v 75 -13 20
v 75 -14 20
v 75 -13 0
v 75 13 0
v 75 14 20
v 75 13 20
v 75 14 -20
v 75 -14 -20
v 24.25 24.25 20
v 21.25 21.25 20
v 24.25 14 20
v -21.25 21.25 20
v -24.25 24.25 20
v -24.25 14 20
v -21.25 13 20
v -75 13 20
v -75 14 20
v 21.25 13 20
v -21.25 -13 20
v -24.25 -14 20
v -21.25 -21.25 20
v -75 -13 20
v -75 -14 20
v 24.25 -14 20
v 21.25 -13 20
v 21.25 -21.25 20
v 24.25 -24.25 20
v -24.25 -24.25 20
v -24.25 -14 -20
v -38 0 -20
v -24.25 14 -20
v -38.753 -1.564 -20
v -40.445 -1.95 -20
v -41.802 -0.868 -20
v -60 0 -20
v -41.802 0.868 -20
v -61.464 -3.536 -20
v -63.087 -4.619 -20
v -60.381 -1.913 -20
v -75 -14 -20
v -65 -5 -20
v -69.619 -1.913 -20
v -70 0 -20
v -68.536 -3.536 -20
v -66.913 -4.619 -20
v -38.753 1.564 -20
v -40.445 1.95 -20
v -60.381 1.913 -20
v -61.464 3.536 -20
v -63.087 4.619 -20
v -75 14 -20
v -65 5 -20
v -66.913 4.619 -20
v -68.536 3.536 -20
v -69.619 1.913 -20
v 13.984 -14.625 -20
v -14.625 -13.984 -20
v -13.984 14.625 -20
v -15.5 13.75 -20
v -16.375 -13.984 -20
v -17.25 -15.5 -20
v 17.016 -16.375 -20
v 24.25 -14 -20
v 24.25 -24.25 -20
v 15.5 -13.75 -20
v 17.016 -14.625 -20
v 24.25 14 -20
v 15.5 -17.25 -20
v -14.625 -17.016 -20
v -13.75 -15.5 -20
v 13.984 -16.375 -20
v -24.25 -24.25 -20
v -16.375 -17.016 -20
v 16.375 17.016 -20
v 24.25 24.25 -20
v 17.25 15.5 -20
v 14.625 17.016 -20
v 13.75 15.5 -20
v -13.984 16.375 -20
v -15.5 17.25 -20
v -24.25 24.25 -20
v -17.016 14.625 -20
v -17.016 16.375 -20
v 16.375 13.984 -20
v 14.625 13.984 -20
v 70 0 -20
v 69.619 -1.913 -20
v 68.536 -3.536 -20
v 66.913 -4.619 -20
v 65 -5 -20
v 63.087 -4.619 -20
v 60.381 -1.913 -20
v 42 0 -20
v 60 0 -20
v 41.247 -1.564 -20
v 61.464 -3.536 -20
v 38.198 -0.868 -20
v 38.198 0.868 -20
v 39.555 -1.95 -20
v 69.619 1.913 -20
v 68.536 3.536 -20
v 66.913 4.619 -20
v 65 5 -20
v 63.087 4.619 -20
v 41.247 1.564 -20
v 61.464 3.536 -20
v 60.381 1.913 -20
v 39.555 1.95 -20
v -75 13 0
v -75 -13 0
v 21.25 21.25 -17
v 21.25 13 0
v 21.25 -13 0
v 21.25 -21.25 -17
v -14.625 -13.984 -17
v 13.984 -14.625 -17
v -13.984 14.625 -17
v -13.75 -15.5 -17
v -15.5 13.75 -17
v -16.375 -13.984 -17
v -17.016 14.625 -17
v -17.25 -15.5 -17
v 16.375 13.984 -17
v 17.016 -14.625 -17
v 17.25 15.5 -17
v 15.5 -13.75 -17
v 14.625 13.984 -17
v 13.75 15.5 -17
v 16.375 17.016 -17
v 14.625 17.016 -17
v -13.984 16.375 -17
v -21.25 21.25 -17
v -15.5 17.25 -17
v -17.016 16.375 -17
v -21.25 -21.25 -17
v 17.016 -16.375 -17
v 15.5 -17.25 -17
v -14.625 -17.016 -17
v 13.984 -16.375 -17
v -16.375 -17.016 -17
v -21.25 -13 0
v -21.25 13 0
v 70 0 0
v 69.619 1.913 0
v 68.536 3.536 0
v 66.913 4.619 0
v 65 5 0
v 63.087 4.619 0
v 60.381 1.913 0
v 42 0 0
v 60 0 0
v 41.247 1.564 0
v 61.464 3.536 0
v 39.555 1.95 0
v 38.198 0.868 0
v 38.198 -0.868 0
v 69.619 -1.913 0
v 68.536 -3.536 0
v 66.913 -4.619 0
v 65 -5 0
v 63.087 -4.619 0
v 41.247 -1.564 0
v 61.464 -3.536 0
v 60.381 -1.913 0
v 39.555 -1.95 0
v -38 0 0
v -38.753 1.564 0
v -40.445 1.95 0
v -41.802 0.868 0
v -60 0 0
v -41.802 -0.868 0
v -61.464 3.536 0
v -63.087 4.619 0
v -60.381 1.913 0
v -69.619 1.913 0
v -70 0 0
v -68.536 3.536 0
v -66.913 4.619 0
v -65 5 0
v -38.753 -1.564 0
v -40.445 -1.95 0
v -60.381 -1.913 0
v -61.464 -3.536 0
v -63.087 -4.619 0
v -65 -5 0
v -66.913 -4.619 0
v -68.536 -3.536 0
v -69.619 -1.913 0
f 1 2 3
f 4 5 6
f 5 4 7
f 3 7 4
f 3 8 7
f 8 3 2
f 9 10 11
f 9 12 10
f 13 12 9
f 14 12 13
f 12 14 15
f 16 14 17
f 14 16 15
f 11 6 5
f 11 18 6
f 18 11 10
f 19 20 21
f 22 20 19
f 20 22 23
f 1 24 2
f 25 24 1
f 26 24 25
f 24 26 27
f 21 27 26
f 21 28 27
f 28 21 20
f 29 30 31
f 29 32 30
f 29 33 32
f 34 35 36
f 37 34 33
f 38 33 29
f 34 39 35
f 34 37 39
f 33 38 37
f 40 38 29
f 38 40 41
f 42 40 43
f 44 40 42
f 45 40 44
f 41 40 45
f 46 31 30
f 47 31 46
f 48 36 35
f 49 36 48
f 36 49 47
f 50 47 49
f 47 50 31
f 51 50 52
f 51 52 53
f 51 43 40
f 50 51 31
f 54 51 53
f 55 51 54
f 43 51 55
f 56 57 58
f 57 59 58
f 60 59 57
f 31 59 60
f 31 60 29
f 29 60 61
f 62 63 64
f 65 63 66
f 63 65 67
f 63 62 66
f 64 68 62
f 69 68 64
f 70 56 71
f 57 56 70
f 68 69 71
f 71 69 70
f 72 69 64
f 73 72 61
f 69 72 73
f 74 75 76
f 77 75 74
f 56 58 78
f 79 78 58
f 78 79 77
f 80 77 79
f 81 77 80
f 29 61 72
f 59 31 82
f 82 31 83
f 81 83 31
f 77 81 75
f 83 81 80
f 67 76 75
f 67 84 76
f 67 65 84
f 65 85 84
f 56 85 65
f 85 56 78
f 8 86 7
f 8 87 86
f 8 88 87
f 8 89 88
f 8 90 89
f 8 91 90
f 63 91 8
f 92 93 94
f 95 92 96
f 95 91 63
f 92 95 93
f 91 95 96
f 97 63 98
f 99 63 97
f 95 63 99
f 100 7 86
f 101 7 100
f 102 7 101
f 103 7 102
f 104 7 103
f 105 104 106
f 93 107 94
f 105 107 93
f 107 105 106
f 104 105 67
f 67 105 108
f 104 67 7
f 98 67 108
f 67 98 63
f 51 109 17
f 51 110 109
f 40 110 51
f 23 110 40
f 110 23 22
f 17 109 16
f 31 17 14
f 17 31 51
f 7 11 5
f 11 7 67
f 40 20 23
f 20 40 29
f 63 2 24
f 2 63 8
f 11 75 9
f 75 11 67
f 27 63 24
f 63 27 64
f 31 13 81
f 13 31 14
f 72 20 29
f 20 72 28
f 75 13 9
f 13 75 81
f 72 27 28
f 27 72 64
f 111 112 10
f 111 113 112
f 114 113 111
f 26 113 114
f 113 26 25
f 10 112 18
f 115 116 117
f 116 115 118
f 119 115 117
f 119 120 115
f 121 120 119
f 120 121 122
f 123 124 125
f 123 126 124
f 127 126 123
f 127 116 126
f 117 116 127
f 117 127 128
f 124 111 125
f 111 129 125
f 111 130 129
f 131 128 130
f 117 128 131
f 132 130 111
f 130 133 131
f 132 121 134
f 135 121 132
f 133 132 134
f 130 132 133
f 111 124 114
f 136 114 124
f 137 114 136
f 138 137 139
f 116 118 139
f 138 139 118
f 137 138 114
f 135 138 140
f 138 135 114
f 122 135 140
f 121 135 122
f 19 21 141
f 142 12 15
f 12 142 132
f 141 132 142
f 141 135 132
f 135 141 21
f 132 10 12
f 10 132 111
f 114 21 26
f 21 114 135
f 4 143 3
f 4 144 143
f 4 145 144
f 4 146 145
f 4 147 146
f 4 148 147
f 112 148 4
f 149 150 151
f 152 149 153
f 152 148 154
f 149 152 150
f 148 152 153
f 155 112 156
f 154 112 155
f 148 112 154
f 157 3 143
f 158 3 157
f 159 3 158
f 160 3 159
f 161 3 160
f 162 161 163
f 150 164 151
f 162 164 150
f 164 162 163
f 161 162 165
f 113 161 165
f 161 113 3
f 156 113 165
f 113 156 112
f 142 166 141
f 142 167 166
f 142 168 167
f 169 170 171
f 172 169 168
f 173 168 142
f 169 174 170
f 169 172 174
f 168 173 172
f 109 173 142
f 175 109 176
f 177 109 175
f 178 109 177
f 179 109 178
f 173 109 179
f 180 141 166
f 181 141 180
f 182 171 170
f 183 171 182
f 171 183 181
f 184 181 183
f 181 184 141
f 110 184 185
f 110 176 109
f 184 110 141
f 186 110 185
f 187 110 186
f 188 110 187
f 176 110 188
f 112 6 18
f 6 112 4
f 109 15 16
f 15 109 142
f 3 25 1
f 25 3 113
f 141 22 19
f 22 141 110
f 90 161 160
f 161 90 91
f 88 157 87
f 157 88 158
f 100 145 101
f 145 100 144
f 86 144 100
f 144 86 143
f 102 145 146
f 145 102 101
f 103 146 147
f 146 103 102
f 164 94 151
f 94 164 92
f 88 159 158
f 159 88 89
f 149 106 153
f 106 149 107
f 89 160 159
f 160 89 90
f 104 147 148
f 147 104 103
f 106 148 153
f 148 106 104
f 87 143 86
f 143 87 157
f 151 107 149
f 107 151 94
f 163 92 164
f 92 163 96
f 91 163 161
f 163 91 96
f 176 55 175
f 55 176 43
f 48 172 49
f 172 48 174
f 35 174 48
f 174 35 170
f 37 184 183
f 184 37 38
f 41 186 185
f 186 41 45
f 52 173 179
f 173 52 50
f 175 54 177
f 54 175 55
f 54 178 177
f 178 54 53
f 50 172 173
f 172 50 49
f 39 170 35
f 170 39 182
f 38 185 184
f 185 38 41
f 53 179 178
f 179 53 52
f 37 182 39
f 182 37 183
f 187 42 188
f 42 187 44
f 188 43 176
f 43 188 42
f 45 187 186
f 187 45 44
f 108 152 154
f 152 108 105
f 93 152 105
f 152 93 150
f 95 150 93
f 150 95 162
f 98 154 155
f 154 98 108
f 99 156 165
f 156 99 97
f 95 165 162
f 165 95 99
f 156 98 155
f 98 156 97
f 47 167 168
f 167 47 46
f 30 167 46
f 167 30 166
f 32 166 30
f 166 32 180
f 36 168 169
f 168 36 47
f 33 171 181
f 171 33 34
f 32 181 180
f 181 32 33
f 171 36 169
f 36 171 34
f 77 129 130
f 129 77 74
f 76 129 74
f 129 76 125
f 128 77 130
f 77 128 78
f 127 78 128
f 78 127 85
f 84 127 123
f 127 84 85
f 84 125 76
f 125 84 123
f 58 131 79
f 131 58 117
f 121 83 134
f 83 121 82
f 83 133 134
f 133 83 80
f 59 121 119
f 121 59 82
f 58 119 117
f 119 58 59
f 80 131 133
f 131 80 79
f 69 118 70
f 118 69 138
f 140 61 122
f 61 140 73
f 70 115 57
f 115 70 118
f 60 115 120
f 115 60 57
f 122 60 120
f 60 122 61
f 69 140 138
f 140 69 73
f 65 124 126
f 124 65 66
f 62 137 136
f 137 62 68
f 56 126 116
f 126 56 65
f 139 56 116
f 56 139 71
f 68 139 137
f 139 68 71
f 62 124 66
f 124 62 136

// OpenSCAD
// file: veriables.scad
aluminum_width			= 20;
wall_thickness			= 3;
depth						= 20;
smooth_rod				= 10;
long_bearing_od			= 19;
long_bearing_length		= 29;
bearing_outer			= 22;
bearing_inner			= 8;
bearing_thick				= 7;
screw_diamiter			= 4;
motor_width				= 42.5;
motor_screw_space		= 31;

hotend_gap				= 6;
hotend_gap_dia			= 12;
hotend_top				= 3;
hotend_top_dia			= 16;

x_rod_spacing			= 60;

aluminum_plate_thick	= 3;
// main file
include <veriables.scad>;

difference(){
	union(){
		cube([150,bearing_outer+(wall_thickness*2),aluminum_width*2],center=true);
		cube([motor_width+(wall_thickness*2),motor_width+(wall_thickness*2),aluminum_width*2],center=true);
	}
	translate([0,0,wall_thickness])cube([motor_width,motor_width,aluminum_width*2],center=true);
	translate([0,0,aluminum_width]) cube([150,aluminum_width+(wall_thickness*2),aluminum_width*2],center=true);
	translate([150/2-smooth_rod,0,0]) cylinder(d=smooth_rod,h=100,center=true);
	translate([-150/2+smooth_rod,0,0]) cylinder(d=smooth_rod,h=100,center=true);
	//T-slot screw holes
	translate([150/3-smooth_rod,0,0]) cylinder(d=screw_diamiter,h=100,center=true);
	translate([-150/3+smooth_rod,0,0]) cylinder(d=screw_diamiter,h=100,center=true);
	//motor_screws
	translate([motor_screw_space/2,motor_screw_space/2,0]) cylinder(d=3.5, h=200, center=true);
	rotate([0,0,90]) translate([motor_screw_space/2,motor_screw_space/2,0]) cylinder(d=3.5, h=200, center=true);
	rotate([0,0,180]) translate([motor_screw_space/2,motor_screw_space/2,0]) cylinder(d=3.5, h=200, center=true);
	rotate([0,0,-90]) translate([motor_screw_space/2,motor_screw_space/2,0]) cylinder(d=3.5, h=200, center=true);
}
